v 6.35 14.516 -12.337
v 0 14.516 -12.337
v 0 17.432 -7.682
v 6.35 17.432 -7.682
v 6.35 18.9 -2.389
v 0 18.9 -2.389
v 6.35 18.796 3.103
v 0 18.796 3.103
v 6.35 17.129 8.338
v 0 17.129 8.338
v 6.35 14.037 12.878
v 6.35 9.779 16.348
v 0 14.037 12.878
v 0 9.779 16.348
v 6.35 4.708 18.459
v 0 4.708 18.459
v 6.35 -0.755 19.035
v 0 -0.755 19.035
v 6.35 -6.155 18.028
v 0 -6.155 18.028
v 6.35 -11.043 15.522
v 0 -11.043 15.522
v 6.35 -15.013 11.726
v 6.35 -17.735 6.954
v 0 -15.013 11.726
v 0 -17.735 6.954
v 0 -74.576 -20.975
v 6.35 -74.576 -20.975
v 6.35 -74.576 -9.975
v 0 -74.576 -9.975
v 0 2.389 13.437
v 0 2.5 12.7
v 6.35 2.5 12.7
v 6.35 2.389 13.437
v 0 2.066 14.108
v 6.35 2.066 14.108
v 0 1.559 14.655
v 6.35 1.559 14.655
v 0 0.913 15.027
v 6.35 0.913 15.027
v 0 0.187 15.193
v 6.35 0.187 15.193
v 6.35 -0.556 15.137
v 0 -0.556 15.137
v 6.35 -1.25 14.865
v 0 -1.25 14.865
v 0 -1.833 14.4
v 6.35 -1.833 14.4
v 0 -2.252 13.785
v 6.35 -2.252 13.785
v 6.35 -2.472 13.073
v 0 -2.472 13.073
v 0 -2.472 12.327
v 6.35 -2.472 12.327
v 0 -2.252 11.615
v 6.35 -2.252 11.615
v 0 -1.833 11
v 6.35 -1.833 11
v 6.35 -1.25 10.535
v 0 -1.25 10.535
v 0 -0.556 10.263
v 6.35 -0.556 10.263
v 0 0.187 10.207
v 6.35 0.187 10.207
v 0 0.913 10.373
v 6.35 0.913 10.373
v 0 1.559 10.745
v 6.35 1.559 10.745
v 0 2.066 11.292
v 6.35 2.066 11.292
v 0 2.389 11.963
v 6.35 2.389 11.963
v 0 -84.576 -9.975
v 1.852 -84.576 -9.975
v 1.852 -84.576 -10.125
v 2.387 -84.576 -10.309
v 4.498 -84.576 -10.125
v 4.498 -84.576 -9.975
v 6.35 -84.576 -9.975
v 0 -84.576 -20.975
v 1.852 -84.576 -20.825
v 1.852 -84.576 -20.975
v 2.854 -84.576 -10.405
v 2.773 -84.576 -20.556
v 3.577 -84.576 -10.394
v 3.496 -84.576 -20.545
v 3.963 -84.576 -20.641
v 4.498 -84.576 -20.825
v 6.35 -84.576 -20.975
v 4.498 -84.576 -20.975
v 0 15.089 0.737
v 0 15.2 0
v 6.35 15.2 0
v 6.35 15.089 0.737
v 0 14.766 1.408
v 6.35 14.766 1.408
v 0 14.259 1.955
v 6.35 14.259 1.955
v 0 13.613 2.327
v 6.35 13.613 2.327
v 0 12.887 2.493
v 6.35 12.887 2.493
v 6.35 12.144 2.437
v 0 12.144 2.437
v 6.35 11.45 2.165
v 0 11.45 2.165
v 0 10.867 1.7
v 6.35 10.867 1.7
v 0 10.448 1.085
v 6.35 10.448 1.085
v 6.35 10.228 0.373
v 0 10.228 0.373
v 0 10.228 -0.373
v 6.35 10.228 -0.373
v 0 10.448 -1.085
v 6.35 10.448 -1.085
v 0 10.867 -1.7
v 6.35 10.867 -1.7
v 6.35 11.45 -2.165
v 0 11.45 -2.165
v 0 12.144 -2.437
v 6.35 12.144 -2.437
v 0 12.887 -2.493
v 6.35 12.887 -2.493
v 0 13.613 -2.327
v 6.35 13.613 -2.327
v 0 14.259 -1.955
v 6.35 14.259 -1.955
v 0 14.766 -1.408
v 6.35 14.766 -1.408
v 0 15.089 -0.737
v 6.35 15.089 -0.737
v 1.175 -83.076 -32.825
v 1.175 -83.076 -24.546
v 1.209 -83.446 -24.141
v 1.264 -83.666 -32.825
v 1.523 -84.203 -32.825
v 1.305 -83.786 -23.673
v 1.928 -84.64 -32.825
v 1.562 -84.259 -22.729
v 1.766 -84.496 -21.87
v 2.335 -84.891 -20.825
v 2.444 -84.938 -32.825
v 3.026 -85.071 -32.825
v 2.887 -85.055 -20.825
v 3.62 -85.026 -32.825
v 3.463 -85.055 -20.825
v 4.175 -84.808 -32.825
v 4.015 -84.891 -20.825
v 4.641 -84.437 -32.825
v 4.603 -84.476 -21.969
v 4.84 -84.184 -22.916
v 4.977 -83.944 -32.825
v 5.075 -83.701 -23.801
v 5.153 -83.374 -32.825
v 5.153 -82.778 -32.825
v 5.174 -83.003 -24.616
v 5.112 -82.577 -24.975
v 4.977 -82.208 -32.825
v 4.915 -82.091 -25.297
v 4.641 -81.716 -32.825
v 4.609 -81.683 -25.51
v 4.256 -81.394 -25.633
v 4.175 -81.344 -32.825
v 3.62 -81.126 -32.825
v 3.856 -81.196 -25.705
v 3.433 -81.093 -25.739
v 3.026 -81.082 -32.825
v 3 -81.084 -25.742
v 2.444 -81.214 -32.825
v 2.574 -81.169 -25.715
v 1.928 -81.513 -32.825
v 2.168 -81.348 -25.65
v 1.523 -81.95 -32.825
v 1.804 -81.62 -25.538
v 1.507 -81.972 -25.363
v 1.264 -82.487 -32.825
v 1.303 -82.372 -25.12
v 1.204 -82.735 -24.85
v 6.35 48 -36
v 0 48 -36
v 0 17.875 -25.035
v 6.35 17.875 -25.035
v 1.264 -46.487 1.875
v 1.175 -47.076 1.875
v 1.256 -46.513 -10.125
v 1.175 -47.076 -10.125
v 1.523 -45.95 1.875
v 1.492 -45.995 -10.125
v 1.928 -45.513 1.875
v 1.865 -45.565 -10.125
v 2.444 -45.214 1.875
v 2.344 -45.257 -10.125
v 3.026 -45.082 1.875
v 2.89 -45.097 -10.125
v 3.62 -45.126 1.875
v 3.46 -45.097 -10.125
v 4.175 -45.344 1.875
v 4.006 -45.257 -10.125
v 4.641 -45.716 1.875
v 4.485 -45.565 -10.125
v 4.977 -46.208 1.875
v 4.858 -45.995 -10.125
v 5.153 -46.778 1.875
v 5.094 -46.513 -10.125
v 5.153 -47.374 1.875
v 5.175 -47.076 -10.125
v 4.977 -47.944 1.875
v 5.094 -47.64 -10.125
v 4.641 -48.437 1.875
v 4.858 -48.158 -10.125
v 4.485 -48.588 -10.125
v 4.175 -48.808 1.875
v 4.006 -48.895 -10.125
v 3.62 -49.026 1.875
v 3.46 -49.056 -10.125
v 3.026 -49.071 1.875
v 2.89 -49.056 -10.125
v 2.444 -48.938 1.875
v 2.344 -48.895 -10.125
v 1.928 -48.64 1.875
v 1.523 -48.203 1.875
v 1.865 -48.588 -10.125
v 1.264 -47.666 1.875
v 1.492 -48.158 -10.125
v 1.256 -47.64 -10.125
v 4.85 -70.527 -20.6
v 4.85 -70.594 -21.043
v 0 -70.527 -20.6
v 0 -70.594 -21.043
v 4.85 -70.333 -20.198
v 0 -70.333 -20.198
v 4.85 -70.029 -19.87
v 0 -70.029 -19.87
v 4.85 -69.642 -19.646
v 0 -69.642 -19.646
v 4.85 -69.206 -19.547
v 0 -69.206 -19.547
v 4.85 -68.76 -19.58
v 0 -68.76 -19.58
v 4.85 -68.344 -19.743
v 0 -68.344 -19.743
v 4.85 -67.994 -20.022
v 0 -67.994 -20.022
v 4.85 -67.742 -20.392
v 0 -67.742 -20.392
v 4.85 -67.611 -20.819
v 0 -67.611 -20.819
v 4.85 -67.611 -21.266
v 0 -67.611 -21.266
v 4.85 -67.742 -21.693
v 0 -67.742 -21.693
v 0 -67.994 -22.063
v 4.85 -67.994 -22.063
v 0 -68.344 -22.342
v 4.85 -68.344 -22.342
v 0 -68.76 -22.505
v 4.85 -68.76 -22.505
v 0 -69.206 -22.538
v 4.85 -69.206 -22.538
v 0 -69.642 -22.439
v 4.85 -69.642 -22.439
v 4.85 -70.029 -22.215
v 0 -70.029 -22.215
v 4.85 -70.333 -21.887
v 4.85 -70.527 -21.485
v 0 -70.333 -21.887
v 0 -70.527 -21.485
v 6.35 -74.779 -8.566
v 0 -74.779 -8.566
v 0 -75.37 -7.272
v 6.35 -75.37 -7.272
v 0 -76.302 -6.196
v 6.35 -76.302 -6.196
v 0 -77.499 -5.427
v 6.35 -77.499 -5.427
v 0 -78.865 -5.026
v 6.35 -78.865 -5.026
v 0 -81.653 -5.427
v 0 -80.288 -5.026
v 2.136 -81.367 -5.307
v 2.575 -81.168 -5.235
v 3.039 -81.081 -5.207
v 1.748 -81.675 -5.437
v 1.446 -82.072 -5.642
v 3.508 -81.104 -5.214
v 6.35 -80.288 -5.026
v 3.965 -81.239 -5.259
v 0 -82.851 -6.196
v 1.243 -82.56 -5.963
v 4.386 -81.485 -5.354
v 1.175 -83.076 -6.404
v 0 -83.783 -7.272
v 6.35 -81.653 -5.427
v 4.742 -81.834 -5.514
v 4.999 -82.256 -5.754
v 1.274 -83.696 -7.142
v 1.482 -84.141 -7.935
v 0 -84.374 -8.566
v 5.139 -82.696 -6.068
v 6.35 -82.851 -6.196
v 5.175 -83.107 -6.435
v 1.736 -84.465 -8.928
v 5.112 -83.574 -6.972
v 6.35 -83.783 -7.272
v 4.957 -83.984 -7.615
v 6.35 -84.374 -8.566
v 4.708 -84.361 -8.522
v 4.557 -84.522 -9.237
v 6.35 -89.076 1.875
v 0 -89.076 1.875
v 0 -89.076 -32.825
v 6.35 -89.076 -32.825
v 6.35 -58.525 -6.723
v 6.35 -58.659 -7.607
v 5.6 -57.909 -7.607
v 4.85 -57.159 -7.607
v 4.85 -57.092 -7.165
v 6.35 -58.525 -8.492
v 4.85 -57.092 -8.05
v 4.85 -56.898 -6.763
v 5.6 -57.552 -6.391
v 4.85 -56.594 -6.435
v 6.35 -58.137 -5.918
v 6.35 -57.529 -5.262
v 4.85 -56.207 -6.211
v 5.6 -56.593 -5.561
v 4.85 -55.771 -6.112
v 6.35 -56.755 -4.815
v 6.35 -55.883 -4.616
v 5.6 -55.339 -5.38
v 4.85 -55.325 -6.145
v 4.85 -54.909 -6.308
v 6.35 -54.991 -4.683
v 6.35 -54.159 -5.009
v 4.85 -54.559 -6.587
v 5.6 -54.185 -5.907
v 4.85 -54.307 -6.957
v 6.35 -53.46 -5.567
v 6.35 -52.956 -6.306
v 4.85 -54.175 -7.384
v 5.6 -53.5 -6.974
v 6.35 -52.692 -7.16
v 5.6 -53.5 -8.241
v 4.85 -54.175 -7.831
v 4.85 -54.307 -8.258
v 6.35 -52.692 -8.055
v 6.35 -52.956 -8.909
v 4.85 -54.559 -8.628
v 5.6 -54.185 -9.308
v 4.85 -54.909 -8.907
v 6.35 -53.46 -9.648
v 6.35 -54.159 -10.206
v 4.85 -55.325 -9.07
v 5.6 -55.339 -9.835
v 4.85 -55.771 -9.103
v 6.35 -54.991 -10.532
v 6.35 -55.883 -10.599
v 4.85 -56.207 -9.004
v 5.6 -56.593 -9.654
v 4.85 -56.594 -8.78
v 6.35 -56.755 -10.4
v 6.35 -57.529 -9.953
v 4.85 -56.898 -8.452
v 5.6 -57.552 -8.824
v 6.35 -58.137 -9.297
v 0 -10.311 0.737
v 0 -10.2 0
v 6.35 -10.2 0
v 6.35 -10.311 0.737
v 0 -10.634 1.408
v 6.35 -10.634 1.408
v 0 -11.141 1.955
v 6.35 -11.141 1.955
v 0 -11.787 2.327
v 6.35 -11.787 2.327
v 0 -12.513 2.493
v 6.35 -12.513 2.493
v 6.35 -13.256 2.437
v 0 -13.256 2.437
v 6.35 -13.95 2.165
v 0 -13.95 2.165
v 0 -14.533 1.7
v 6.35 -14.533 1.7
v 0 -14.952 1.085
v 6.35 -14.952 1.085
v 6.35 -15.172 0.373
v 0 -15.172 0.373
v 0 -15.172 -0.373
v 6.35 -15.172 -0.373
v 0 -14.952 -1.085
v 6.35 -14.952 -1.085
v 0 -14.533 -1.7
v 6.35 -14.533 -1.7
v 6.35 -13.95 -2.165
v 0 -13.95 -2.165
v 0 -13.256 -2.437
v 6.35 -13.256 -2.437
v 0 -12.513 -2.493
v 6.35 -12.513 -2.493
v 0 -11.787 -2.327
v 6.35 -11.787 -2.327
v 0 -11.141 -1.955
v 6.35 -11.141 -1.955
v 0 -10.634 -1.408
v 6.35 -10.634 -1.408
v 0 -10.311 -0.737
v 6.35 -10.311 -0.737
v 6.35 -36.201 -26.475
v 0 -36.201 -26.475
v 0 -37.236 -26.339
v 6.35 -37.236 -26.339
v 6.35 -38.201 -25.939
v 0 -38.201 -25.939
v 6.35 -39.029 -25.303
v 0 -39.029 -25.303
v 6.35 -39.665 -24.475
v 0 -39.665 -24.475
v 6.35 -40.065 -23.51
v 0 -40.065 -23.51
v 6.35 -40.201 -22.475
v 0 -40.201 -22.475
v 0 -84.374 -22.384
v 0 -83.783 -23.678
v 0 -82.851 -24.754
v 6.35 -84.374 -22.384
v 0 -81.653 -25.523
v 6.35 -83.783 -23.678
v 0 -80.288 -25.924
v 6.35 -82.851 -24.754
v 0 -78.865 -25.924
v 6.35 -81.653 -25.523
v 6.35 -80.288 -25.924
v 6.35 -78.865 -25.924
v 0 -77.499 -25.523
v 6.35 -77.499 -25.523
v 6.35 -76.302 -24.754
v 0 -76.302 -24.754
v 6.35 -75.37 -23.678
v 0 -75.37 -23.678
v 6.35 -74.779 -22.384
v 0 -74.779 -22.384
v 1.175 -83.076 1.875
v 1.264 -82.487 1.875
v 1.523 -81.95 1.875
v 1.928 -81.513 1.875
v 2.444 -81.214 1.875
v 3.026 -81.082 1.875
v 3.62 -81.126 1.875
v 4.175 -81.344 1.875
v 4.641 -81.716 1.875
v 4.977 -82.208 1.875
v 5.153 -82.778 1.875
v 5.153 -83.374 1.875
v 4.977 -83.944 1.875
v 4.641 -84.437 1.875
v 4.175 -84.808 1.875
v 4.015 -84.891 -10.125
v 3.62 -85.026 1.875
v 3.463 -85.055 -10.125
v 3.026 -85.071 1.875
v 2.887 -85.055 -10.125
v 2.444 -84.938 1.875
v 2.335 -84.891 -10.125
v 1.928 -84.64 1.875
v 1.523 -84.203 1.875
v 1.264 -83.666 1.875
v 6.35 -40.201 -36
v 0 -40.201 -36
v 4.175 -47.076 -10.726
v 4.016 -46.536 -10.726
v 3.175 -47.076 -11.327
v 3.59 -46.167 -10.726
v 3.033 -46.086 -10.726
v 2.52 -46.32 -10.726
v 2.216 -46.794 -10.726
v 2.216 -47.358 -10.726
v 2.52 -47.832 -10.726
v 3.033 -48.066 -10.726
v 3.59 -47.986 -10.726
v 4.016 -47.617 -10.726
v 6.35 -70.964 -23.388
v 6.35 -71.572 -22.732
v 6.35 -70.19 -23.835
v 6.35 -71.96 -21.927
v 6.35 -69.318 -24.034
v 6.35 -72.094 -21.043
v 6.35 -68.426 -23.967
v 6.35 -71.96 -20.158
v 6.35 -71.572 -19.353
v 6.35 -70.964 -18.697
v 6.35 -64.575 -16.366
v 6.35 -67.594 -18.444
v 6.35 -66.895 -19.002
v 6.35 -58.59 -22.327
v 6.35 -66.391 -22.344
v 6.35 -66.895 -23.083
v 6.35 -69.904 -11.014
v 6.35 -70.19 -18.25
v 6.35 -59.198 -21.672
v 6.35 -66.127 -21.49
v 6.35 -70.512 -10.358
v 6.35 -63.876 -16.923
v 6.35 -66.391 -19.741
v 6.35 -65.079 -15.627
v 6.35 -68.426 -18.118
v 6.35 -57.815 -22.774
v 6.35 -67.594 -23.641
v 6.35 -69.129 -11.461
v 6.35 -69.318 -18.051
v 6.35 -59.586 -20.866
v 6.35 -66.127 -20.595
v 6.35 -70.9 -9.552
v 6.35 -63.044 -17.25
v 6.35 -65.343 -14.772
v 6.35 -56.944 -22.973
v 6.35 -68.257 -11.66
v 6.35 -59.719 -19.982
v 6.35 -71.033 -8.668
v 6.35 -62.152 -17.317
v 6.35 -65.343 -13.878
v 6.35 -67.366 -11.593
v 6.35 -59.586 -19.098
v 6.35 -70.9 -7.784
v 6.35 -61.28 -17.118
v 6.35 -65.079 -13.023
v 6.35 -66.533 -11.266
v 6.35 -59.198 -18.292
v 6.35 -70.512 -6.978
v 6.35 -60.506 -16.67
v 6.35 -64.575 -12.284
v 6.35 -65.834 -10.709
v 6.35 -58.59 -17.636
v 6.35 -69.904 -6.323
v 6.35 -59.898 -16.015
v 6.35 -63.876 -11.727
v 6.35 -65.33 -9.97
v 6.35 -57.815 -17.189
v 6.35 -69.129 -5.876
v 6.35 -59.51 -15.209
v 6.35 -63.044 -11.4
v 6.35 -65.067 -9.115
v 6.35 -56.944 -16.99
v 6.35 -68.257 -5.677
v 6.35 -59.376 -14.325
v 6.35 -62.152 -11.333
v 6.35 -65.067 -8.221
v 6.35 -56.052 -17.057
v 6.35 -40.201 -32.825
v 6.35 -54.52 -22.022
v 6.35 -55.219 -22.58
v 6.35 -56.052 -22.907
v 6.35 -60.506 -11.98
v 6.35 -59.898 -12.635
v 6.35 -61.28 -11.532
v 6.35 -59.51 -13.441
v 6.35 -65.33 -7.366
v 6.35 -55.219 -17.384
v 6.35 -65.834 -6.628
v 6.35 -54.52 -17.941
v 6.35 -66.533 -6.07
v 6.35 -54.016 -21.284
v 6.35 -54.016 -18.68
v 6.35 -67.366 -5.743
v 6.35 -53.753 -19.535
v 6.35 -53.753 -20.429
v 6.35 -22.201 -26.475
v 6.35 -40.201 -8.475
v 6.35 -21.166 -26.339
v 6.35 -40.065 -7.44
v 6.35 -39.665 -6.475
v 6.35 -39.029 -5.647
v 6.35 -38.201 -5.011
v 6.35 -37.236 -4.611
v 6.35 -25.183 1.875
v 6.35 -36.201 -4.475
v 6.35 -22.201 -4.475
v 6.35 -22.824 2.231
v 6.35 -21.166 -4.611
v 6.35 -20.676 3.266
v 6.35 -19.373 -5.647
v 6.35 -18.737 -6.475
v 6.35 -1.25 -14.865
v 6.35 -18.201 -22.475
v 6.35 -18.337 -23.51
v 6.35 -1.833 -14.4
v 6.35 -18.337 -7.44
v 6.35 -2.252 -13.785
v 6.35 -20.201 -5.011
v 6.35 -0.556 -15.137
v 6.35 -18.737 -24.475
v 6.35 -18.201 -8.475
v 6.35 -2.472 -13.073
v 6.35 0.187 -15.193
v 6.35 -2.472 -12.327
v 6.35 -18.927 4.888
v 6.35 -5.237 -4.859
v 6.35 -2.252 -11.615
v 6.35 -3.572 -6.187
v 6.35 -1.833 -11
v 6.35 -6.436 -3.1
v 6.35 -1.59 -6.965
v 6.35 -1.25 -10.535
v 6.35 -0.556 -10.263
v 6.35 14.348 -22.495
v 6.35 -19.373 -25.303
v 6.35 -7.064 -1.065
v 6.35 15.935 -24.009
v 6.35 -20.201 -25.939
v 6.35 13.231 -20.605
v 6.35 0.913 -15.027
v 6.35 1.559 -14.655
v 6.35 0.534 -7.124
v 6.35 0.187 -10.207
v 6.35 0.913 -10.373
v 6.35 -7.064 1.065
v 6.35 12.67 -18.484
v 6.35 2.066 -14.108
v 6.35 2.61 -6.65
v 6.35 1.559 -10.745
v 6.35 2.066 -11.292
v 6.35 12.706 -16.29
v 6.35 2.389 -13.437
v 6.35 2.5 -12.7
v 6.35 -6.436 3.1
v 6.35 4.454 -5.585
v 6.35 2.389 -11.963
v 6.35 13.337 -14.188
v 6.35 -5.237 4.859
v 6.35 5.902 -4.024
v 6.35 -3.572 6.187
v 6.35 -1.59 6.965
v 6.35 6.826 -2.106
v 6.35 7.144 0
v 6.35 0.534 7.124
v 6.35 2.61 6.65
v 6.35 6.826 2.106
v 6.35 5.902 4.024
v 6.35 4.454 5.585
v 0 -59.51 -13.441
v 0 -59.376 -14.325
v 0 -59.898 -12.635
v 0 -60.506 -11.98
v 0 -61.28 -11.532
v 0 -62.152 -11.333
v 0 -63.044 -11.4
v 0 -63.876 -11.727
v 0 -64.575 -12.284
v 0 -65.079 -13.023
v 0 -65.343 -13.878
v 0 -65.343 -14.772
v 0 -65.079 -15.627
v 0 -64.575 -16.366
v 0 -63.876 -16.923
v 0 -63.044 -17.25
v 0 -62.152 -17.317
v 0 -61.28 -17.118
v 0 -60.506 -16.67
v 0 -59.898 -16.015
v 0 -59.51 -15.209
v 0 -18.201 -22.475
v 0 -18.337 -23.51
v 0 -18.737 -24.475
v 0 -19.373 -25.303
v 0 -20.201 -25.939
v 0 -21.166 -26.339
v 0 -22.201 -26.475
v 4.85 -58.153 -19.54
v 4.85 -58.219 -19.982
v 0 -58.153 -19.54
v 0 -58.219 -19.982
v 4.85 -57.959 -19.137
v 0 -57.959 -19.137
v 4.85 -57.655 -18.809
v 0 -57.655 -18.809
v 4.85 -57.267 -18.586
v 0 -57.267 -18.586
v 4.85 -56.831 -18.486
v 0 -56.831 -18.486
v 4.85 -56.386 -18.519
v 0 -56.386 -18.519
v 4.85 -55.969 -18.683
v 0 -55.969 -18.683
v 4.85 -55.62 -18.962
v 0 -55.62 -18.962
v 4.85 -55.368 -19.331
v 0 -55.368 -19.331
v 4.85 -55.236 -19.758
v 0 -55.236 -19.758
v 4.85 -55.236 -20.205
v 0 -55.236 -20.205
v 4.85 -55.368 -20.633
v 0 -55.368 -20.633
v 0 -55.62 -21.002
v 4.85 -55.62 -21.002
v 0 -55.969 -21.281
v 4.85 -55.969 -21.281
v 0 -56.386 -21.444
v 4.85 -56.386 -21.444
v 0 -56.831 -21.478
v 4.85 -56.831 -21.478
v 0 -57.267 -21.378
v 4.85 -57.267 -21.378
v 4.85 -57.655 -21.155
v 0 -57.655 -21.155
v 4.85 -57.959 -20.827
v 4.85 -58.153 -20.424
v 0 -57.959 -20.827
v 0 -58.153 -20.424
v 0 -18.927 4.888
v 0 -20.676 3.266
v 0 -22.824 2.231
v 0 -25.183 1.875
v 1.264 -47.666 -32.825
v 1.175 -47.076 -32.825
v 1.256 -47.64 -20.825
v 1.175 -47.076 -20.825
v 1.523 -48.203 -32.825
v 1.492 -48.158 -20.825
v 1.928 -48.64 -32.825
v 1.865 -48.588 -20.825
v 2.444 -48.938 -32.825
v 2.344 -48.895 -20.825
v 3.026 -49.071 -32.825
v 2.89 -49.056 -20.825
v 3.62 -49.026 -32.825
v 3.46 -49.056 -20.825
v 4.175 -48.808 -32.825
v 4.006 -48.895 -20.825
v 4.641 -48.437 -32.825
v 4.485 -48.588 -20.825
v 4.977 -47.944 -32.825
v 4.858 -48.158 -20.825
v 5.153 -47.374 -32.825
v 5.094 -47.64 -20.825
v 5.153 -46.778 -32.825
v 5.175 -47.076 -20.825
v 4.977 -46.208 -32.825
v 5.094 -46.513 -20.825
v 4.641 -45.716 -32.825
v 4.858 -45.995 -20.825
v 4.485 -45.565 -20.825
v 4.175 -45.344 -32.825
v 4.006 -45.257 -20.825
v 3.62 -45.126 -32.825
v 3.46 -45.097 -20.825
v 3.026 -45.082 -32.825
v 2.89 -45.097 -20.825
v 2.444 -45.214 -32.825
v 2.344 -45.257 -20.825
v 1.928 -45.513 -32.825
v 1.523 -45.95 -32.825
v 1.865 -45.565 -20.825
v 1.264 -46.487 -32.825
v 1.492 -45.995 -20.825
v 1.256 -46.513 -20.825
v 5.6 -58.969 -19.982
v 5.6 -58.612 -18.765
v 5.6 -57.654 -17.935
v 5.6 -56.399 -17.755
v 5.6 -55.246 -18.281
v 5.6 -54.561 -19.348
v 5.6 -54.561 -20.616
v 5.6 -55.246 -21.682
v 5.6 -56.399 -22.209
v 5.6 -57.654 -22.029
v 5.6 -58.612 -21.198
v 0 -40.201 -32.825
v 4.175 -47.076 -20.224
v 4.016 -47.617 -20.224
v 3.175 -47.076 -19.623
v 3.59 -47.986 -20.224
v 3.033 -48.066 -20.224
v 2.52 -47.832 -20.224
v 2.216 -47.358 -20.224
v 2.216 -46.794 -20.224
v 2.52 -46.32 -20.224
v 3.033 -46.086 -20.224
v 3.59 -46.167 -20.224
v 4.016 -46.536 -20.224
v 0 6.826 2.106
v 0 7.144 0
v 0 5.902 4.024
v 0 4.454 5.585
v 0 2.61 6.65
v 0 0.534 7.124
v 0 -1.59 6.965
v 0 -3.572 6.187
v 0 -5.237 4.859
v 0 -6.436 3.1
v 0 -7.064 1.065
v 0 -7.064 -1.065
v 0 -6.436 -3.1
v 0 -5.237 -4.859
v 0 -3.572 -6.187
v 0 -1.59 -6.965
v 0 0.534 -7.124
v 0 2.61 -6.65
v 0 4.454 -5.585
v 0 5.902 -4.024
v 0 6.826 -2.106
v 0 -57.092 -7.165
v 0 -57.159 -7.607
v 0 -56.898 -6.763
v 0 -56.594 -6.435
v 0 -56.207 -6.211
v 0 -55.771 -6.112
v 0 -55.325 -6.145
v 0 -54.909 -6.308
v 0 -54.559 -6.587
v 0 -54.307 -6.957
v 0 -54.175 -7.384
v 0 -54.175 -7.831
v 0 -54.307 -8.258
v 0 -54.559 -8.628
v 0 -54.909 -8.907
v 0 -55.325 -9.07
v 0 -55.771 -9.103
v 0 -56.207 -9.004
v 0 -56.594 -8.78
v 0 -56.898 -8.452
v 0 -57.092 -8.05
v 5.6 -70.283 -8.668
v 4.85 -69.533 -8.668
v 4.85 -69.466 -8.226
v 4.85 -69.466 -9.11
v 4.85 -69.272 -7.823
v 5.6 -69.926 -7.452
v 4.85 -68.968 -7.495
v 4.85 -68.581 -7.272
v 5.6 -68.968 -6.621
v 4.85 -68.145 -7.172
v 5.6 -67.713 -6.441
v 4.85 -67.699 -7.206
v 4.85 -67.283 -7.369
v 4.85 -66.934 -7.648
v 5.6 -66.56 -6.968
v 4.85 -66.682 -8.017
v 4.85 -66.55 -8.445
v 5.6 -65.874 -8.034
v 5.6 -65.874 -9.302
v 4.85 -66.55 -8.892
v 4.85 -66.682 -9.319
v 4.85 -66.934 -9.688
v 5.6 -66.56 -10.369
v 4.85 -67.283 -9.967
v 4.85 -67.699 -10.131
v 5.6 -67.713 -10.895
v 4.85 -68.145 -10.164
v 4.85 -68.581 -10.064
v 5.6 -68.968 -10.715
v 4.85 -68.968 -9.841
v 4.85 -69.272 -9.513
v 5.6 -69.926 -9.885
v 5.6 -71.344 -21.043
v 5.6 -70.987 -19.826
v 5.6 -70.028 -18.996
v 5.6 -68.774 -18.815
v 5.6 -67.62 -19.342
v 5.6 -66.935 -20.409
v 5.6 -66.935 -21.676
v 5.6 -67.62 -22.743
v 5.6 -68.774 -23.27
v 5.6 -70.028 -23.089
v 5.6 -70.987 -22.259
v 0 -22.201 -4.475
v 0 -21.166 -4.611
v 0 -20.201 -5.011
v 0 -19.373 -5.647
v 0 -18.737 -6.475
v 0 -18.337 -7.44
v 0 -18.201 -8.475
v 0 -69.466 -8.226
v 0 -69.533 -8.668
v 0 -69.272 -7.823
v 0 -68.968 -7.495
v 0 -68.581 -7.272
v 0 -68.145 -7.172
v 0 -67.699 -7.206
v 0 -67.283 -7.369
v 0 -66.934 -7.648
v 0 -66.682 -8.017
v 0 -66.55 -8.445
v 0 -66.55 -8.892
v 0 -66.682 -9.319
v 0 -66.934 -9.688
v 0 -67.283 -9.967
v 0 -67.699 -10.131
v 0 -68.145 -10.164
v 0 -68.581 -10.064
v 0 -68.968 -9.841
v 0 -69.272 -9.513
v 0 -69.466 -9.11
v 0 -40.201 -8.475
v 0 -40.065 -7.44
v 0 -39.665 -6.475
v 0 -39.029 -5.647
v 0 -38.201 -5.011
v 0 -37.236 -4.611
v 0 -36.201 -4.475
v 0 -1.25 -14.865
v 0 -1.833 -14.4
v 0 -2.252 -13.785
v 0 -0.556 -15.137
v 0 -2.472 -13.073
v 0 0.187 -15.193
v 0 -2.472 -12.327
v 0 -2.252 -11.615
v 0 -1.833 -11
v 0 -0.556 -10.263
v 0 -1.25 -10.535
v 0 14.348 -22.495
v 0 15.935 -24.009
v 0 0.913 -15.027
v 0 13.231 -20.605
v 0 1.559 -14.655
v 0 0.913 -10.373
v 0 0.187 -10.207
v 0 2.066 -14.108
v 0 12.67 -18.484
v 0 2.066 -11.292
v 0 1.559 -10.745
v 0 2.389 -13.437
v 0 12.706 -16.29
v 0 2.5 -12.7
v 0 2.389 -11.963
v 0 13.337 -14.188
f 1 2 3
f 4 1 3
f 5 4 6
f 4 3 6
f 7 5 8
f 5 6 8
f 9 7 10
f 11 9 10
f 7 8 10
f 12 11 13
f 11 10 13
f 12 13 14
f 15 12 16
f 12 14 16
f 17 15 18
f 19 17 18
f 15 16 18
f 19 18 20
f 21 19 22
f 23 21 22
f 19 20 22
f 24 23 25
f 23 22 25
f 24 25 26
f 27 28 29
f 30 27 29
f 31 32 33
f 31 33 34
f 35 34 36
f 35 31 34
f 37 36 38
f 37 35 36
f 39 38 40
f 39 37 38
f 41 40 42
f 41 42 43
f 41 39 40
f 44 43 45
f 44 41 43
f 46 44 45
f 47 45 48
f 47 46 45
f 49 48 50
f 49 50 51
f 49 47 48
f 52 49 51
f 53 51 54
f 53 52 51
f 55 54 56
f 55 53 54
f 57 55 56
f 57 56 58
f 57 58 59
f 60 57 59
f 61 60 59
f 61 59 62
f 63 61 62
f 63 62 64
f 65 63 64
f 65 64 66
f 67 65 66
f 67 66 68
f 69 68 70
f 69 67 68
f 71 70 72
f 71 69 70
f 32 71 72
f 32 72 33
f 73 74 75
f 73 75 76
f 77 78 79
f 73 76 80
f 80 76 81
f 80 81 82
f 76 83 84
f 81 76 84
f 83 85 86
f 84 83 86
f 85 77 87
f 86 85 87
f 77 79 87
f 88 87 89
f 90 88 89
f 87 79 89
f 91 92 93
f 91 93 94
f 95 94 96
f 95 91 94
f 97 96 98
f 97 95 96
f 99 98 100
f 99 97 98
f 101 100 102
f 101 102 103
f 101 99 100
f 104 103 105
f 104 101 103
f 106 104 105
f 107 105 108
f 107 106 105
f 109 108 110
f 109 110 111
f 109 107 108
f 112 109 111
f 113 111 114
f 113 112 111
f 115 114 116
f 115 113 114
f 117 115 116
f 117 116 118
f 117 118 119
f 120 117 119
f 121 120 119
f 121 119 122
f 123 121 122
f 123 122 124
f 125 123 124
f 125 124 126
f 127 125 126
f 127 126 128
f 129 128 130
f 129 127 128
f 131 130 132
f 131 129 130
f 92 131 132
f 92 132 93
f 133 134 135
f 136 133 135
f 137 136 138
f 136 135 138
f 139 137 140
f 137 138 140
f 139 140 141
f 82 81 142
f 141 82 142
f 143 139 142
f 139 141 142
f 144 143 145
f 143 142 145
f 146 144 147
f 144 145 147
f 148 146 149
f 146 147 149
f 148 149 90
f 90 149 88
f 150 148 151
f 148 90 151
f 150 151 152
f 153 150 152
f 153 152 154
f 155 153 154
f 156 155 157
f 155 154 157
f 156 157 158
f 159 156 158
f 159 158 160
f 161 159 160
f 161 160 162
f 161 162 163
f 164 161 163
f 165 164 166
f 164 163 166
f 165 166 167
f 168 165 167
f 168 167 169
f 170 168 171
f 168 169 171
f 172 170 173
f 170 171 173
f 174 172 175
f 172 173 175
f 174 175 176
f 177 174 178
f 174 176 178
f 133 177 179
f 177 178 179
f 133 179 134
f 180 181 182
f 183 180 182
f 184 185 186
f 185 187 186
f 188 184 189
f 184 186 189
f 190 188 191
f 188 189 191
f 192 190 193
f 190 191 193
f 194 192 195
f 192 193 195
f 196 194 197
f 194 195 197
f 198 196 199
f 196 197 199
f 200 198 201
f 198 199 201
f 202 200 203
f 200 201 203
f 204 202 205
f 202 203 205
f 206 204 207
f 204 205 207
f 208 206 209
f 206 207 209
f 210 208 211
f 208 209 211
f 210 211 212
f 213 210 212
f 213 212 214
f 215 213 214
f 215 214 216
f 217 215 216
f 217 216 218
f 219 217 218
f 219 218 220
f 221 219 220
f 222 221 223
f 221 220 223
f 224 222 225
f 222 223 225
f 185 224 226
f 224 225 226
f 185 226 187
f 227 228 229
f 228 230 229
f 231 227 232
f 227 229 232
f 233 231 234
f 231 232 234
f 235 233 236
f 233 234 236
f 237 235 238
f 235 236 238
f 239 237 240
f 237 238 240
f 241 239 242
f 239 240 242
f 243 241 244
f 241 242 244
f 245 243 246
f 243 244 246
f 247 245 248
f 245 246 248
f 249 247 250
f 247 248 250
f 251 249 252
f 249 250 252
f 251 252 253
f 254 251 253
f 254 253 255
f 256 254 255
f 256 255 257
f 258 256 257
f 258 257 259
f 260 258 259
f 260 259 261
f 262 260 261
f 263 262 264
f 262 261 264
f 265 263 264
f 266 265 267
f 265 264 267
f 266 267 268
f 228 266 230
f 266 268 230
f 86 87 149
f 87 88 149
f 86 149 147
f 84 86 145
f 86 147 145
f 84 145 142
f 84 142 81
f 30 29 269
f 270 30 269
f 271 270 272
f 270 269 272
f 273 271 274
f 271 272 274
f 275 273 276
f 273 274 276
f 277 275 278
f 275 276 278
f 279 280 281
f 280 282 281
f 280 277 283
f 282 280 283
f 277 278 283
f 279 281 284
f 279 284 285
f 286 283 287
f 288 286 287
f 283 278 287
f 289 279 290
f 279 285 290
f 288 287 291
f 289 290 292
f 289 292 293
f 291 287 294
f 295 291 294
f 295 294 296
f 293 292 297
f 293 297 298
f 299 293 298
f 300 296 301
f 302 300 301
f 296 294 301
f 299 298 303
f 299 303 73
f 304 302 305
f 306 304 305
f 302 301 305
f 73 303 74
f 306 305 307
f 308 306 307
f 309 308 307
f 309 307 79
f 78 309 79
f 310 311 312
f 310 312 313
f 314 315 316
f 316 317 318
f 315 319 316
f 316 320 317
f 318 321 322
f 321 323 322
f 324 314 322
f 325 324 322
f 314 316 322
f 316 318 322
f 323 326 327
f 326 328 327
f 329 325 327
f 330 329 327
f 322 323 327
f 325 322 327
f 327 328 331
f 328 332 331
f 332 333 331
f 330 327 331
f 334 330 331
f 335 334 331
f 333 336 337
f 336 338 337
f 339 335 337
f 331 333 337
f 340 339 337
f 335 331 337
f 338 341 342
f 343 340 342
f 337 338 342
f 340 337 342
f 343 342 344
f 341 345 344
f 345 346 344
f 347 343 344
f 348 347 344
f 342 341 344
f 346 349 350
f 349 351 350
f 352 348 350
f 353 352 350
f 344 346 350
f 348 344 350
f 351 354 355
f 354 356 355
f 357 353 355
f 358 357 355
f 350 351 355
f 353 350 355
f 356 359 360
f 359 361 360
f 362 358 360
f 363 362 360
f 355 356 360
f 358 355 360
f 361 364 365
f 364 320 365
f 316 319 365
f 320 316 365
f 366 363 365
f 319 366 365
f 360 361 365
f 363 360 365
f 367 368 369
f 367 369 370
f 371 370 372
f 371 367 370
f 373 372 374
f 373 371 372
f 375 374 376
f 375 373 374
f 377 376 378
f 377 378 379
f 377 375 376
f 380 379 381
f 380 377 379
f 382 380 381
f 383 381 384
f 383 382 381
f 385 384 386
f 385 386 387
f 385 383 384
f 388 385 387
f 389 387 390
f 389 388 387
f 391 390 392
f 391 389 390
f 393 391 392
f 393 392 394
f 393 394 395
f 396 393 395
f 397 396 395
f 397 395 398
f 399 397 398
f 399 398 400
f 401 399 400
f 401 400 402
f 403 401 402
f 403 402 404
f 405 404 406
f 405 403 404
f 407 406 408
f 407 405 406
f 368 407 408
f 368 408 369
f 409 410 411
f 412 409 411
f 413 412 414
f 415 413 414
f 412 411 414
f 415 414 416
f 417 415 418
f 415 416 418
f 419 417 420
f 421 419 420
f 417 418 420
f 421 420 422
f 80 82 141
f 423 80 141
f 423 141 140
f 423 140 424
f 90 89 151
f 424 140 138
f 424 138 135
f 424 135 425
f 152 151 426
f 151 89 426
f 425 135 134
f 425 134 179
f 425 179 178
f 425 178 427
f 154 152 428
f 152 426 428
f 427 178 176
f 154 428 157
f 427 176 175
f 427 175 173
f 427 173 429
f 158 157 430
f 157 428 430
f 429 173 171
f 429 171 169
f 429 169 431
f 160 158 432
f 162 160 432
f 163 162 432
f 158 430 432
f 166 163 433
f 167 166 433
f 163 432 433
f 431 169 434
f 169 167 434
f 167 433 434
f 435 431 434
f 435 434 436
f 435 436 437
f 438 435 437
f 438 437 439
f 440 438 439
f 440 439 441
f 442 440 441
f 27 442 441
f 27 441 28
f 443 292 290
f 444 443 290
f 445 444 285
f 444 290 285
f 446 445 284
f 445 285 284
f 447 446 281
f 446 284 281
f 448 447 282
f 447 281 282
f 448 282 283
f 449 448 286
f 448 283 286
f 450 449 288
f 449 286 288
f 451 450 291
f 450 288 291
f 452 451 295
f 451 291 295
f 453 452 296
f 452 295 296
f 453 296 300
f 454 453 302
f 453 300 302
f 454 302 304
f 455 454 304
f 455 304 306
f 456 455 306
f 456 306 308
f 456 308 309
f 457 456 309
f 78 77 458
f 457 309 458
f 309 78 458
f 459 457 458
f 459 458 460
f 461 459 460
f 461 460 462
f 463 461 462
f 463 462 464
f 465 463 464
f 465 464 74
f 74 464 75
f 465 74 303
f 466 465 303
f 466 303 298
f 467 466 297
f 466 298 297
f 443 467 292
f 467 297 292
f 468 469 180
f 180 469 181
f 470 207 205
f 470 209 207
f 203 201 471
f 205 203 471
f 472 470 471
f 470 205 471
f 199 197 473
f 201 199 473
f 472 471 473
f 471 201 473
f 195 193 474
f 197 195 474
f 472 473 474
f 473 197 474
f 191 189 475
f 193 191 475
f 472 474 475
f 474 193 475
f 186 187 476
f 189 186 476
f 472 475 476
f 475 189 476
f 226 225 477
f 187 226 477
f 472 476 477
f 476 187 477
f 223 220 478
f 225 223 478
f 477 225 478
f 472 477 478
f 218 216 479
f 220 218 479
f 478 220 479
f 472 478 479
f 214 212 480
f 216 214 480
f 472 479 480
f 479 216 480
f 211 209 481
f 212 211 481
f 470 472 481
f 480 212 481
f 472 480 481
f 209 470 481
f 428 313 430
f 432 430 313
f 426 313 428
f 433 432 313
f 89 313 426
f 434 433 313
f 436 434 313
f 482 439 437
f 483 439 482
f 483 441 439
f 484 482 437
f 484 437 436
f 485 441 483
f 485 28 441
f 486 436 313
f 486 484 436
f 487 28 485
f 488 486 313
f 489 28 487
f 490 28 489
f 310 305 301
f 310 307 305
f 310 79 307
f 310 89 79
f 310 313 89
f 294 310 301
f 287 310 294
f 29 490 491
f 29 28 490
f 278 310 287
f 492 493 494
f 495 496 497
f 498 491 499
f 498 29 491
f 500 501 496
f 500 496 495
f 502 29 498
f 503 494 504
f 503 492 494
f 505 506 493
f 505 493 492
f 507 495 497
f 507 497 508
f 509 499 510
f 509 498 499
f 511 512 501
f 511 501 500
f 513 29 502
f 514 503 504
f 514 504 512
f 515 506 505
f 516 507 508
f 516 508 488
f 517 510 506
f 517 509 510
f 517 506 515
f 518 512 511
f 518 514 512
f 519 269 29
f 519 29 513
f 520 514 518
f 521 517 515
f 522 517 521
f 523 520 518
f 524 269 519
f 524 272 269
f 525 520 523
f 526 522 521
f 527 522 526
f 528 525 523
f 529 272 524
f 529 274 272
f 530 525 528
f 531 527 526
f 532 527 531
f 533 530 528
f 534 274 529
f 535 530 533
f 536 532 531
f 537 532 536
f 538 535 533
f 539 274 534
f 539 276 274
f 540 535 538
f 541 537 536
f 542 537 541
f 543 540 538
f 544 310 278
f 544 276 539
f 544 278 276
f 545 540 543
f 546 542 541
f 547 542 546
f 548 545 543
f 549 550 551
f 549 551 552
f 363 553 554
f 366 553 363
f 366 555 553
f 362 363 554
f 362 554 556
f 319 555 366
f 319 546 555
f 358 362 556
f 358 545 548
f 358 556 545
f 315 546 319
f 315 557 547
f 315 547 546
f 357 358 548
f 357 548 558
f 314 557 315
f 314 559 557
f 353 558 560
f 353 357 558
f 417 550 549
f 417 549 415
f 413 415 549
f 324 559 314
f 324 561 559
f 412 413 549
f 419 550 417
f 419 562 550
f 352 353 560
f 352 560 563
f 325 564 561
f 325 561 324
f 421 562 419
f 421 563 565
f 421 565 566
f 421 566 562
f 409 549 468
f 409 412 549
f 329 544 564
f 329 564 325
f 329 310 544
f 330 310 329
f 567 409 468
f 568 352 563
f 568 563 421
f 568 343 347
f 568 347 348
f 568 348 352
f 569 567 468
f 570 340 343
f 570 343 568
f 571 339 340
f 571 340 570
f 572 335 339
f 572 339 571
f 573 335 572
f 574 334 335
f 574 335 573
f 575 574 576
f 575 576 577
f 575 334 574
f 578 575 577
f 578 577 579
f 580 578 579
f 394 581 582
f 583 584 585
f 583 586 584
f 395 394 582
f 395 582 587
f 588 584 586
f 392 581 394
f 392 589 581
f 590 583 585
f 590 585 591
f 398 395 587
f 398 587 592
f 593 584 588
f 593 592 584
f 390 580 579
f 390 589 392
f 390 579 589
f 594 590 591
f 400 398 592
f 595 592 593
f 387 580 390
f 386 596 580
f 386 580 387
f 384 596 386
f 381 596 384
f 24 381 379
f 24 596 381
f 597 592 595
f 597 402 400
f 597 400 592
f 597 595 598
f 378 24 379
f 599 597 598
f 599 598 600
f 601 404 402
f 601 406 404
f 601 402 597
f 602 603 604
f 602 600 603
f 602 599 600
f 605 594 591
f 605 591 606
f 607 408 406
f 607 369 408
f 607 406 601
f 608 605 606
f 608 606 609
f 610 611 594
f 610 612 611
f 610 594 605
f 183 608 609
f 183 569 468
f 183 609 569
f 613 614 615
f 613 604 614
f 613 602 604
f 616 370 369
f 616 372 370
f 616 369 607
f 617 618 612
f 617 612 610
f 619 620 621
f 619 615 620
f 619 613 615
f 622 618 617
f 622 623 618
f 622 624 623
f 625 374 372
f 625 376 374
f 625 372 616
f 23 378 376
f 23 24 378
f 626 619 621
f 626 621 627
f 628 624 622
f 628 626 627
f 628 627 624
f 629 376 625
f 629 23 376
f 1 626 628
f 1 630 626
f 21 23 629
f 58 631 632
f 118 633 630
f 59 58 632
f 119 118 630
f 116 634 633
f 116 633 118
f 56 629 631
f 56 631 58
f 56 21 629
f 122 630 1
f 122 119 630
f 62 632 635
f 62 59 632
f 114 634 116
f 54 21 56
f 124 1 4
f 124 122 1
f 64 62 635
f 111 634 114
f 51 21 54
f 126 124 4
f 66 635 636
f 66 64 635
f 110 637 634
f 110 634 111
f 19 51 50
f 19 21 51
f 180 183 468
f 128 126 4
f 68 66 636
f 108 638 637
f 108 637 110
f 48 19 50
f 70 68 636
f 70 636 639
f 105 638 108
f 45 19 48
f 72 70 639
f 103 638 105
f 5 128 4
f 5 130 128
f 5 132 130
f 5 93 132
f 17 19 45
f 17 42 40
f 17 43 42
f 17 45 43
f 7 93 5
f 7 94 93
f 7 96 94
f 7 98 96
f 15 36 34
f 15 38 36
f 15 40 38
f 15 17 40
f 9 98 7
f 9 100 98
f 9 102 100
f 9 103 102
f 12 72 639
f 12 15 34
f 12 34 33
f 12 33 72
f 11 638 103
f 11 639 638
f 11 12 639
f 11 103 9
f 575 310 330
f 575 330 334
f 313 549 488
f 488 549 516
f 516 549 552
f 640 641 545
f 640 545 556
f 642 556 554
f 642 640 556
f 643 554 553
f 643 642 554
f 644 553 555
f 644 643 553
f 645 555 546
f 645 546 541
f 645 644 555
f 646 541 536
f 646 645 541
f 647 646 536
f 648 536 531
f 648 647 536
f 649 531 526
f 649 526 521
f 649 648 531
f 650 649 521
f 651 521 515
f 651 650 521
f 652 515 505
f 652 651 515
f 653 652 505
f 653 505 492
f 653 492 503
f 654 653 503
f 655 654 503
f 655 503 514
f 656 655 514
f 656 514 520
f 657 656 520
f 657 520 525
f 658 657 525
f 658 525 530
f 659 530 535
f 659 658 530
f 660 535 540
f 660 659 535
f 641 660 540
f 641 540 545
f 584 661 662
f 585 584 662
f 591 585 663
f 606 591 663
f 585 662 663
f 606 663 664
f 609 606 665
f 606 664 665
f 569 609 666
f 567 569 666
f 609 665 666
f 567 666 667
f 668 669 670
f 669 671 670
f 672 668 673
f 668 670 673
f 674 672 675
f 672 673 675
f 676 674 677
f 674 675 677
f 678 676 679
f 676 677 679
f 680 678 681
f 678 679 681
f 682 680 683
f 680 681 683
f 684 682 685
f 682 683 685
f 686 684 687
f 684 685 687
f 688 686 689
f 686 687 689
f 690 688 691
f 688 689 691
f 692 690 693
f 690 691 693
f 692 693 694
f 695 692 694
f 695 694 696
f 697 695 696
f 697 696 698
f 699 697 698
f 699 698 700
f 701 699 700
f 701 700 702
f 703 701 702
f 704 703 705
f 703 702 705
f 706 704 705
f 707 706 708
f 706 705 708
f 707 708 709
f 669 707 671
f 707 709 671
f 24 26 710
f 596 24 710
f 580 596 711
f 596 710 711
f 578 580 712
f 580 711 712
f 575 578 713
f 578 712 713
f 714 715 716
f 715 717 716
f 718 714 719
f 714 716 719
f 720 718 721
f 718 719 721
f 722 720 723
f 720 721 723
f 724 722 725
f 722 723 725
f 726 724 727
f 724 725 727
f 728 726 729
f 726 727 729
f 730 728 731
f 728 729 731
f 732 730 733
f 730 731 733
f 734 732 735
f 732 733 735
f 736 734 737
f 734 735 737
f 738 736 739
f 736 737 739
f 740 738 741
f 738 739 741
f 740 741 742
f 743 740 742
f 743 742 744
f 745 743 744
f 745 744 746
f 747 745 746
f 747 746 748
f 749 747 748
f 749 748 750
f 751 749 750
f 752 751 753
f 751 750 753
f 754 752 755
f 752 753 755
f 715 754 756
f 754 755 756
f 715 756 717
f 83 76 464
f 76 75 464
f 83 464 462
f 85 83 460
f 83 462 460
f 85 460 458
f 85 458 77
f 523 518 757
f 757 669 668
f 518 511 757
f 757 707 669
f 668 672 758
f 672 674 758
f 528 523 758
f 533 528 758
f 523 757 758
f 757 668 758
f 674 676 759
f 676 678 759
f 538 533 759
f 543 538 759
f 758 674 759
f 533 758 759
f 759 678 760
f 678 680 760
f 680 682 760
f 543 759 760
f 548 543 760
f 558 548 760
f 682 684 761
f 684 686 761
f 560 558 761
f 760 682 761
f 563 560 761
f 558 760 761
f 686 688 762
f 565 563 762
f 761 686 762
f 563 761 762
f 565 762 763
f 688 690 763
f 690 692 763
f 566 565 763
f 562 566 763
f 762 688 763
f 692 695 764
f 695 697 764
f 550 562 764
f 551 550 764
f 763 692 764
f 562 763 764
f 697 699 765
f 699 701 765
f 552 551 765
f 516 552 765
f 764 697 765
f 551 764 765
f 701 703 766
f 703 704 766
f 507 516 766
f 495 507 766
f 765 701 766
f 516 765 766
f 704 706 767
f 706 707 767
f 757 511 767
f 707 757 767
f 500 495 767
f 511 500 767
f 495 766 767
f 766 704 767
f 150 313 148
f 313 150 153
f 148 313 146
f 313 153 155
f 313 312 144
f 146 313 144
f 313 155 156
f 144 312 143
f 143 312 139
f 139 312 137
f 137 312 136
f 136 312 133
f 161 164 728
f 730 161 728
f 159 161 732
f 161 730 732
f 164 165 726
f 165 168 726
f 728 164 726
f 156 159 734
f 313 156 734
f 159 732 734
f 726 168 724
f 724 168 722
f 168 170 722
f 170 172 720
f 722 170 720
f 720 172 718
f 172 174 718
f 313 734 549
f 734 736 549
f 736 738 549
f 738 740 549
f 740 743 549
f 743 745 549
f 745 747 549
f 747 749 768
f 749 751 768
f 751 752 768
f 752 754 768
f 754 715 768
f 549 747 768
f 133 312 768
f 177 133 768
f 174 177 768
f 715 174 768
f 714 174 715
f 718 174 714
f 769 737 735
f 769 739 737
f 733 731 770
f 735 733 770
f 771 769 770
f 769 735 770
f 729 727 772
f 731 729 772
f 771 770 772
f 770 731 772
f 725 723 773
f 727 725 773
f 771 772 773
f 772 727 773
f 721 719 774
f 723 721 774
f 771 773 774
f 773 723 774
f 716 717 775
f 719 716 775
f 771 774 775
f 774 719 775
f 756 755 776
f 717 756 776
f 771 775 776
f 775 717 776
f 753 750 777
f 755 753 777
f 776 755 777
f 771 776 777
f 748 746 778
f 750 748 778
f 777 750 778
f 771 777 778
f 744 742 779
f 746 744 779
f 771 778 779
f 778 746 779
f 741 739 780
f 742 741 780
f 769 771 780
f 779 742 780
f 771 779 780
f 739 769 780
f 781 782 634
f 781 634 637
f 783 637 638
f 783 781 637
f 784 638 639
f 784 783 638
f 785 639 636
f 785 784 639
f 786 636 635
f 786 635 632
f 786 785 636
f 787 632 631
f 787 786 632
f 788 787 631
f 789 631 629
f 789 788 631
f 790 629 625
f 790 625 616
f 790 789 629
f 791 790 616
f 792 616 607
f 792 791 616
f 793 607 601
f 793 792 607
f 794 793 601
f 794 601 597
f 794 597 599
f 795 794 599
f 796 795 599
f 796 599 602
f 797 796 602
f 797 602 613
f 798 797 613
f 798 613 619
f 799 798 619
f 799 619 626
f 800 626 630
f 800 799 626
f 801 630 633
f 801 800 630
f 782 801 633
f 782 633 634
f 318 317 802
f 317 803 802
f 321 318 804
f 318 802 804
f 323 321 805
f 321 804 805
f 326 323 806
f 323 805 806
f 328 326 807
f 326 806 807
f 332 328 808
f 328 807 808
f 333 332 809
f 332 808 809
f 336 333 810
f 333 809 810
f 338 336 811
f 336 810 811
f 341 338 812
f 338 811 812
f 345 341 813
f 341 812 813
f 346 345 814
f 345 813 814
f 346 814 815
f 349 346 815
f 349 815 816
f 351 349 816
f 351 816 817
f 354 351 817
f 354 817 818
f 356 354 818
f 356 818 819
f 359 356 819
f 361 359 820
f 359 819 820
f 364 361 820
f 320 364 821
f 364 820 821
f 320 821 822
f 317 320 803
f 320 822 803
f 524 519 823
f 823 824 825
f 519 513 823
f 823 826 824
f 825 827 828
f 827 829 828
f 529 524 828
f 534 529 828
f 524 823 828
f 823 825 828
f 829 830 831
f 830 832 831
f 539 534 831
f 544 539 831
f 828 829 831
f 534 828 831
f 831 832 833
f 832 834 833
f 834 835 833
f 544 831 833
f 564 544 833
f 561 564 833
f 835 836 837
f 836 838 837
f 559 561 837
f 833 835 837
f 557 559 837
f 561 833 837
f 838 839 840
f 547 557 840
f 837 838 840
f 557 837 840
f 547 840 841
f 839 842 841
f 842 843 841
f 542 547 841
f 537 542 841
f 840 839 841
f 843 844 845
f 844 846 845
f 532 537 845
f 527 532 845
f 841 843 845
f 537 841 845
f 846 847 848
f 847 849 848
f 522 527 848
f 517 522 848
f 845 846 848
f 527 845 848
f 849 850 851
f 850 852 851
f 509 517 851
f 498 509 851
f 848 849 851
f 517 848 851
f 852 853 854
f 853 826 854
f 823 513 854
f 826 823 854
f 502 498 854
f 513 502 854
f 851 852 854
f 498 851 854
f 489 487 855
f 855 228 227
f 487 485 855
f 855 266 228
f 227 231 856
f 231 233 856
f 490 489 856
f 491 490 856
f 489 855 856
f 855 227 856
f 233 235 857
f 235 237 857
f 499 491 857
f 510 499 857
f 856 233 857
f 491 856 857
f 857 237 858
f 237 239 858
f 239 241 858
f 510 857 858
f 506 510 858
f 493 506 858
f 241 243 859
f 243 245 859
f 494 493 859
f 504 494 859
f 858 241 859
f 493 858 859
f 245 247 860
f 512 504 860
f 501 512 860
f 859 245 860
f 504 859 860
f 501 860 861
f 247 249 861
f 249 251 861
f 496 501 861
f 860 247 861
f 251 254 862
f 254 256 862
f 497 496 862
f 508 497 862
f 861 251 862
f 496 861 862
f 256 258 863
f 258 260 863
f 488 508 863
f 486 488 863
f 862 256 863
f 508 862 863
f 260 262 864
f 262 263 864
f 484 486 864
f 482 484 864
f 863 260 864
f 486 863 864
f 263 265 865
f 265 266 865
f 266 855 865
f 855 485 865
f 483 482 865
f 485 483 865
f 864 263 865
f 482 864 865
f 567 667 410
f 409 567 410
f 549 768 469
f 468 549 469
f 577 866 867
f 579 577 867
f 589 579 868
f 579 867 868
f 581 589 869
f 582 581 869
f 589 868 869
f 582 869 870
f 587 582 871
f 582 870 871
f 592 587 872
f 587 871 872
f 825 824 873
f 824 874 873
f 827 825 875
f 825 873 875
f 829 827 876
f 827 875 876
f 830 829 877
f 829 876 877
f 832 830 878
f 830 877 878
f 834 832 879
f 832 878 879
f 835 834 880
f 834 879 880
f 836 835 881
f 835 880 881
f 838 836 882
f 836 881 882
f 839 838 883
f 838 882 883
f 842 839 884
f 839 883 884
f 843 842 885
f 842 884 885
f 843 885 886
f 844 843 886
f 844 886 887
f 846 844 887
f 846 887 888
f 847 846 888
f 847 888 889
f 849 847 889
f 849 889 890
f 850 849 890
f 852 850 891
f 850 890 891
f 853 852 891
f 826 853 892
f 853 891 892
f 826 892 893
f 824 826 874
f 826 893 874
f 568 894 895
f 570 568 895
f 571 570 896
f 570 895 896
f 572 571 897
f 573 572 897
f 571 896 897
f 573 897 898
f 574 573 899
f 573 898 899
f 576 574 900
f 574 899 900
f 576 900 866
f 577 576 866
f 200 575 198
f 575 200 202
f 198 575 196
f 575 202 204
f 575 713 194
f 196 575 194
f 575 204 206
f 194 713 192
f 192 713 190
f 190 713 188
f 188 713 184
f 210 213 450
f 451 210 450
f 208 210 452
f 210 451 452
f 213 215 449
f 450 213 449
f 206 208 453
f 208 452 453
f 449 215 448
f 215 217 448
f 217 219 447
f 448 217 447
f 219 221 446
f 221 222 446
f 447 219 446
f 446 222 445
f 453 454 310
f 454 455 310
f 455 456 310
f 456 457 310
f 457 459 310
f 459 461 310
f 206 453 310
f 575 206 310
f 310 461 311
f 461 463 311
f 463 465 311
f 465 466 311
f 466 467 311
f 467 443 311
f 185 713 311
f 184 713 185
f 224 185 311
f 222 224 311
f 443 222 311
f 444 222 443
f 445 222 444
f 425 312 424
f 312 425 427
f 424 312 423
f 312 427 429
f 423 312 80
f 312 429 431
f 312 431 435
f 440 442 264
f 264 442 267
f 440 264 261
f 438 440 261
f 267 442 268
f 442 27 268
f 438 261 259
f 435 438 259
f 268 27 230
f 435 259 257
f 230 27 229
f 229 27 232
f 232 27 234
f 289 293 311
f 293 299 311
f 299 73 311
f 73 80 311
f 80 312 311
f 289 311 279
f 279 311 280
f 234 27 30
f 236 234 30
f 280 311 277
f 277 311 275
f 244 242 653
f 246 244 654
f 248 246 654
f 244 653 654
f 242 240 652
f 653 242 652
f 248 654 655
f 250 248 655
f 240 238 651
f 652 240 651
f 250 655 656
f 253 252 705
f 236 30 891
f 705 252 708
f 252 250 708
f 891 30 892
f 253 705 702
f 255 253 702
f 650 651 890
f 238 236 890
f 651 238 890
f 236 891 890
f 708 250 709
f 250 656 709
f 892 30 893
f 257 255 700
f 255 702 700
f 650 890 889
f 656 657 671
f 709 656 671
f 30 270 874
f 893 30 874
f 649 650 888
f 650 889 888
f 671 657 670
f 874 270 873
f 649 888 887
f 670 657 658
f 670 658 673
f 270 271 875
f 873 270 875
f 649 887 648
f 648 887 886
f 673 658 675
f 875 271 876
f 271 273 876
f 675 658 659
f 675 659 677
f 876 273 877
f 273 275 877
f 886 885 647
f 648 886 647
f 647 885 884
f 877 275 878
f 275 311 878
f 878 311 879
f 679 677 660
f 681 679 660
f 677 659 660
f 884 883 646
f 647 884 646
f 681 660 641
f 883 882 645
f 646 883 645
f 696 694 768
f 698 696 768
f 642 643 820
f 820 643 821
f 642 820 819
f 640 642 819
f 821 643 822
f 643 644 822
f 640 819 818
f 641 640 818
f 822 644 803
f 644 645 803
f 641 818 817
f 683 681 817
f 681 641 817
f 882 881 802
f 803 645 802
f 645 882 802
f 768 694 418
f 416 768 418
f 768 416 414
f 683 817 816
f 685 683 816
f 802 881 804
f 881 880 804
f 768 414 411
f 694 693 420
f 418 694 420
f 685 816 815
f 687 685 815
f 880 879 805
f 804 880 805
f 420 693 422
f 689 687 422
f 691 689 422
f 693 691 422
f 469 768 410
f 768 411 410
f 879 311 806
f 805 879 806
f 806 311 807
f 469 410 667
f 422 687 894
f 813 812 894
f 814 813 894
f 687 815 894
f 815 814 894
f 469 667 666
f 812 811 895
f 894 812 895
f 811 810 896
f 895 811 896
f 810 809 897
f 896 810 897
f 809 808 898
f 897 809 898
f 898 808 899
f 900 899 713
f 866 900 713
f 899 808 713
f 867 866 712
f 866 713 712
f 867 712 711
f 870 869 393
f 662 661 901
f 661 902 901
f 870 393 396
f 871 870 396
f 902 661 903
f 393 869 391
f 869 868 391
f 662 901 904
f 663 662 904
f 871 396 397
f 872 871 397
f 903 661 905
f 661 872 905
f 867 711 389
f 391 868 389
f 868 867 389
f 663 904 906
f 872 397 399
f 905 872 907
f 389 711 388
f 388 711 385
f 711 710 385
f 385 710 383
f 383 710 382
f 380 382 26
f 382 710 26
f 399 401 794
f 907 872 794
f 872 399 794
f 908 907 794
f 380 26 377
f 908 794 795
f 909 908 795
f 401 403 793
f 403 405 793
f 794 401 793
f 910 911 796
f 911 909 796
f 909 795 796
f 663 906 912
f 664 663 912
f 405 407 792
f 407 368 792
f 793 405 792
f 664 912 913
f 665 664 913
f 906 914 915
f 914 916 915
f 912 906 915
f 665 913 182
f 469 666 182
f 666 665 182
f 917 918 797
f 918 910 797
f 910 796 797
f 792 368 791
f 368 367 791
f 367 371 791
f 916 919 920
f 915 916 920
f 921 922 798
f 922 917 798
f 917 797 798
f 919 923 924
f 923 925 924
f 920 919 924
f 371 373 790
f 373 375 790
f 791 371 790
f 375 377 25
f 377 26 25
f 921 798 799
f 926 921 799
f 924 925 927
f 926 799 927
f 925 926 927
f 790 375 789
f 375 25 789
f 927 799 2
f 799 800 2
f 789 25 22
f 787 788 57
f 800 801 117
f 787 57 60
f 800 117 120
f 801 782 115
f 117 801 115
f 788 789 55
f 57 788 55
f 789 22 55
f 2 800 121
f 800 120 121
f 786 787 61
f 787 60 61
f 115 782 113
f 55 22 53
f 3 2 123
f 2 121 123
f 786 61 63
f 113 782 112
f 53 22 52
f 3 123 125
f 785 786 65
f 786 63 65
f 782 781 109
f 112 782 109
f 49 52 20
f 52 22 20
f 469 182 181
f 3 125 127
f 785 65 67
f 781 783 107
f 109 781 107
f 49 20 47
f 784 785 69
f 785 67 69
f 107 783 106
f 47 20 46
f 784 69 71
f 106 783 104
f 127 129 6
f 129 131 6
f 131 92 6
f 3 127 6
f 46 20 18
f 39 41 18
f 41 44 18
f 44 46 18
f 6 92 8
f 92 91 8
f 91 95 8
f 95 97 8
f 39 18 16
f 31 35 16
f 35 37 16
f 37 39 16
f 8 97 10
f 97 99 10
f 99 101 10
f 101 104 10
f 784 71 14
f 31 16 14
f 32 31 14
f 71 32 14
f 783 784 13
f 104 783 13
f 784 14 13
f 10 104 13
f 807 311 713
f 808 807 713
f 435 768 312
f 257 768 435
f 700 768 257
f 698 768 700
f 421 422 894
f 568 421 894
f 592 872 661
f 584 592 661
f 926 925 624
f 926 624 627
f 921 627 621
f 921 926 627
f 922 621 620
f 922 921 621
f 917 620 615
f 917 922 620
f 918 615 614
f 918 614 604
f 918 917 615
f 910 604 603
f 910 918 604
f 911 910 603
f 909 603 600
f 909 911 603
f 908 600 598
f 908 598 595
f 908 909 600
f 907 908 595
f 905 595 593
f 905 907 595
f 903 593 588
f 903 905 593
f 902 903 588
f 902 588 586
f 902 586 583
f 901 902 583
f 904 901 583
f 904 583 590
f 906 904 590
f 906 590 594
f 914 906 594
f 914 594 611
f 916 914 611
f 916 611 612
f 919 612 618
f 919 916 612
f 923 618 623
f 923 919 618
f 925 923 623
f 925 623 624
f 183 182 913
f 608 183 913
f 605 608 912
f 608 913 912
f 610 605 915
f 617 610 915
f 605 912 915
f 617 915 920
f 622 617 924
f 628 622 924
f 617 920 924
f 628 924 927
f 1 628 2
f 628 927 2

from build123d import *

# Parameters (mm, degrees)
F0_R           = 3
F0_R_2         = 2.5
F0_R_3         = 7.14375
F1_DEPTH       = 6.35
F3_D           = 3
F3_CSINK_D     = 6
F3_CSINK_ANGLE = 90
F5_DEPTH       = 25
F6_W           = 6.35
F6_H           = 38
F7_DEPTH       = 37.876
F9_D           = 4
F9_DEPTH       = 12
F9_TIP         = 1.2017212381
F11_D          = 4
F11_DEPTH      = 12
F11_TIP        = 1.2017212381


with BuildPart() as f1:
    # F0 (on Right) → F1 (new body)
    with BuildSketch(Plane.YZ):
        with BuildLine():
            ThreePointArc((17.8751346366, -25.0354456965), (12.8773903734, -19.5640491806), (14.5155336292, -12.3370086917))
            ThreePointArc((14.5155336292, -12.3370086917), (9.7791608288, 16.348410121), (-17.735210007, 6.9544824399))
            ThreePointArc((-17.735210007, 6.9544824399), (-20.675525796, 3.2657587243), (-25.1830672278, 1.875))
            Line((-25.1830672278, 1.875), (-127.0762324528, 1.875))
            Line((-127.0762324528, 1.875), (-127.0762324528, -4.475))
            Line((-127.0762324528, -4.475), (-93.0762324528, -4.475))
            ThreePointArc((-93.0762324528, -4.475), (-90.247805328, -5.6465728753), (-89.0762324528, -8.475))
            Line((-89.0762324528, -8.475), (-89.0762324528, -22.475))
            ThreePointArc((-89.0762324528, -22.475), (-90.247805328, -25.3034271247), (-93.0762324528, -26.475))
            Line((-93.0762324528, -26.475), (-127.0762324528, -26.475))
            Line((-127.0762324528, -26.475), (-127.0762324528, -32.825))
            Line((-127.0762324528, -32.825), (-40.201, -32.825))
            Line((-40.201, -32.825), (-40.201, -36))
            Line((-40.201, -36), (48, -36))
            Line((48, -36), (17.8751346366, -25.0354456965))
        make_face()
        with Locations((-62.3762324528, -14.325)):
            Circle(F0_R, mode=Mode.SUBTRACT)
        with BuildLine():
            ThreePointArc((-40.201, -8.475), (-39.0294271247, -5.6465728753), (-36.201, -4.475))
            Line((-36.201, -4.475), (-22.201, -4.475))
            ThreePointArc((-22.201, -4.475), (-19.3725728753, -5.6465728753), (-18.201, -8.475))
            Line((-18.201, -8.475), (-18.201, -22.475))
            ThreePointArc((-18.201, -22.475), (-19.3725728753, -25.3034271247), (-22.201, -26.475))
            Line((-22.201, -26.475), (-36.201, -26.475))
            ThreePointArc((-36.201, -26.475), (-39.0294271247, -25.3034271247), (-40.201, -22.475))
            Line((-40.201, -22.475), (-40.201, -8.475))
        make_face(mode=Mode.SUBTRACT)
        with Locations((0, -12.7)):
            Circle(F0_R_2, mode=Mode.SUBTRACT)
        with Locations((-12.7, 0)):
            Circle(F0_R_2, mode=Mode.SUBTRACT)
        Circle(F0_R_3, mode=Mode.SUBTRACT)
        with Locations((12.7, 0)):
            Circle(F0_R_2, mode=Mode.SUBTRACT)
        with Locations((0, 12.7)):
            Circle(F0_R_2, mode=Mode.SUBTRACT)
    extrude(amount=F1_DEPTH)

    # F3 (through all)
    with Locations(Plane.YZ.offset(6.35)):
        with Locations((-55.6587180315, -7.6074855787), (-68.0330867022, -8.6681457505), (-69.093746874, -21.0425144213), (-56.7193782033, -19.9818542495)):
            CounterSinkHole(F3_D / 2, F3_CSINK_D / 2, counter_sink_angle=F3_CSINK_ANGLE)

    # F4 (on face) → F5 (cut)
    with BuildSketch(Plane.YZ.offset(6.35)):
        with BuildLine():
            ThreePointArc((-74.5762324528, -9.975), (-79.5762324528, -4.975), (-84.5762324528, -9.975))
            Line((-84.5762324528, -9.975), (-84.5762324528, -20.975))
            ThreePointArc((-84.5762324528, -20.975), (-79.5762324528, -25.975), (-74.5762324528, -20.975))
            Line((-74.5762324528, -20.975), (-74.5762324528, -9.975))
        make_face()
    extrude(amount=-F5_DEPTH, mode=Mode.SUBTRACT)

    # F6 (on face) → F7 (cut, through all)
    with BuildSketch(Plane.XY.offset(1.875)):
        with Locations((3.175, -108.0762324528)):
            Rectangle(F6_W, F6_H)
    extrude(amount=-F7_DEPTH, mode=Mode.SUBTRACT)

    # F9
    with Locations(Plane.XY.offset(1.875)):
        with Locations((3.175, -47.0762324528), (3.175, -83.0762324528)):
            Hole(F9_D / 2, depth=F9_DEPTH)
            with Locations((0, 0, -(F9_DEPTH + F9_TIP / 2))):  # 118° drill point
                Cone(0, F9_D / 2, F9_TIP, mode=Mode.SUBTRACT)

    # F11
    with Locations(Plane(origin=(0, 0, -32.825), x_dir=(1, 0, 0), z_dir=(0, 0, -1))):
        with Locations((3.175, 47.0762324528), (3.175, 83.0762324528)):
            Hole(F11_D / 2, depth=F11_DEPTH)
            with Locations((0, 0, -(F11_DEPTH + F11_TIP / 2))):  # 118° drill point
                Cone(0, F11_D / 2, F11_TIP, mode=Mode.SUBTRACT)


solid = f1.part
